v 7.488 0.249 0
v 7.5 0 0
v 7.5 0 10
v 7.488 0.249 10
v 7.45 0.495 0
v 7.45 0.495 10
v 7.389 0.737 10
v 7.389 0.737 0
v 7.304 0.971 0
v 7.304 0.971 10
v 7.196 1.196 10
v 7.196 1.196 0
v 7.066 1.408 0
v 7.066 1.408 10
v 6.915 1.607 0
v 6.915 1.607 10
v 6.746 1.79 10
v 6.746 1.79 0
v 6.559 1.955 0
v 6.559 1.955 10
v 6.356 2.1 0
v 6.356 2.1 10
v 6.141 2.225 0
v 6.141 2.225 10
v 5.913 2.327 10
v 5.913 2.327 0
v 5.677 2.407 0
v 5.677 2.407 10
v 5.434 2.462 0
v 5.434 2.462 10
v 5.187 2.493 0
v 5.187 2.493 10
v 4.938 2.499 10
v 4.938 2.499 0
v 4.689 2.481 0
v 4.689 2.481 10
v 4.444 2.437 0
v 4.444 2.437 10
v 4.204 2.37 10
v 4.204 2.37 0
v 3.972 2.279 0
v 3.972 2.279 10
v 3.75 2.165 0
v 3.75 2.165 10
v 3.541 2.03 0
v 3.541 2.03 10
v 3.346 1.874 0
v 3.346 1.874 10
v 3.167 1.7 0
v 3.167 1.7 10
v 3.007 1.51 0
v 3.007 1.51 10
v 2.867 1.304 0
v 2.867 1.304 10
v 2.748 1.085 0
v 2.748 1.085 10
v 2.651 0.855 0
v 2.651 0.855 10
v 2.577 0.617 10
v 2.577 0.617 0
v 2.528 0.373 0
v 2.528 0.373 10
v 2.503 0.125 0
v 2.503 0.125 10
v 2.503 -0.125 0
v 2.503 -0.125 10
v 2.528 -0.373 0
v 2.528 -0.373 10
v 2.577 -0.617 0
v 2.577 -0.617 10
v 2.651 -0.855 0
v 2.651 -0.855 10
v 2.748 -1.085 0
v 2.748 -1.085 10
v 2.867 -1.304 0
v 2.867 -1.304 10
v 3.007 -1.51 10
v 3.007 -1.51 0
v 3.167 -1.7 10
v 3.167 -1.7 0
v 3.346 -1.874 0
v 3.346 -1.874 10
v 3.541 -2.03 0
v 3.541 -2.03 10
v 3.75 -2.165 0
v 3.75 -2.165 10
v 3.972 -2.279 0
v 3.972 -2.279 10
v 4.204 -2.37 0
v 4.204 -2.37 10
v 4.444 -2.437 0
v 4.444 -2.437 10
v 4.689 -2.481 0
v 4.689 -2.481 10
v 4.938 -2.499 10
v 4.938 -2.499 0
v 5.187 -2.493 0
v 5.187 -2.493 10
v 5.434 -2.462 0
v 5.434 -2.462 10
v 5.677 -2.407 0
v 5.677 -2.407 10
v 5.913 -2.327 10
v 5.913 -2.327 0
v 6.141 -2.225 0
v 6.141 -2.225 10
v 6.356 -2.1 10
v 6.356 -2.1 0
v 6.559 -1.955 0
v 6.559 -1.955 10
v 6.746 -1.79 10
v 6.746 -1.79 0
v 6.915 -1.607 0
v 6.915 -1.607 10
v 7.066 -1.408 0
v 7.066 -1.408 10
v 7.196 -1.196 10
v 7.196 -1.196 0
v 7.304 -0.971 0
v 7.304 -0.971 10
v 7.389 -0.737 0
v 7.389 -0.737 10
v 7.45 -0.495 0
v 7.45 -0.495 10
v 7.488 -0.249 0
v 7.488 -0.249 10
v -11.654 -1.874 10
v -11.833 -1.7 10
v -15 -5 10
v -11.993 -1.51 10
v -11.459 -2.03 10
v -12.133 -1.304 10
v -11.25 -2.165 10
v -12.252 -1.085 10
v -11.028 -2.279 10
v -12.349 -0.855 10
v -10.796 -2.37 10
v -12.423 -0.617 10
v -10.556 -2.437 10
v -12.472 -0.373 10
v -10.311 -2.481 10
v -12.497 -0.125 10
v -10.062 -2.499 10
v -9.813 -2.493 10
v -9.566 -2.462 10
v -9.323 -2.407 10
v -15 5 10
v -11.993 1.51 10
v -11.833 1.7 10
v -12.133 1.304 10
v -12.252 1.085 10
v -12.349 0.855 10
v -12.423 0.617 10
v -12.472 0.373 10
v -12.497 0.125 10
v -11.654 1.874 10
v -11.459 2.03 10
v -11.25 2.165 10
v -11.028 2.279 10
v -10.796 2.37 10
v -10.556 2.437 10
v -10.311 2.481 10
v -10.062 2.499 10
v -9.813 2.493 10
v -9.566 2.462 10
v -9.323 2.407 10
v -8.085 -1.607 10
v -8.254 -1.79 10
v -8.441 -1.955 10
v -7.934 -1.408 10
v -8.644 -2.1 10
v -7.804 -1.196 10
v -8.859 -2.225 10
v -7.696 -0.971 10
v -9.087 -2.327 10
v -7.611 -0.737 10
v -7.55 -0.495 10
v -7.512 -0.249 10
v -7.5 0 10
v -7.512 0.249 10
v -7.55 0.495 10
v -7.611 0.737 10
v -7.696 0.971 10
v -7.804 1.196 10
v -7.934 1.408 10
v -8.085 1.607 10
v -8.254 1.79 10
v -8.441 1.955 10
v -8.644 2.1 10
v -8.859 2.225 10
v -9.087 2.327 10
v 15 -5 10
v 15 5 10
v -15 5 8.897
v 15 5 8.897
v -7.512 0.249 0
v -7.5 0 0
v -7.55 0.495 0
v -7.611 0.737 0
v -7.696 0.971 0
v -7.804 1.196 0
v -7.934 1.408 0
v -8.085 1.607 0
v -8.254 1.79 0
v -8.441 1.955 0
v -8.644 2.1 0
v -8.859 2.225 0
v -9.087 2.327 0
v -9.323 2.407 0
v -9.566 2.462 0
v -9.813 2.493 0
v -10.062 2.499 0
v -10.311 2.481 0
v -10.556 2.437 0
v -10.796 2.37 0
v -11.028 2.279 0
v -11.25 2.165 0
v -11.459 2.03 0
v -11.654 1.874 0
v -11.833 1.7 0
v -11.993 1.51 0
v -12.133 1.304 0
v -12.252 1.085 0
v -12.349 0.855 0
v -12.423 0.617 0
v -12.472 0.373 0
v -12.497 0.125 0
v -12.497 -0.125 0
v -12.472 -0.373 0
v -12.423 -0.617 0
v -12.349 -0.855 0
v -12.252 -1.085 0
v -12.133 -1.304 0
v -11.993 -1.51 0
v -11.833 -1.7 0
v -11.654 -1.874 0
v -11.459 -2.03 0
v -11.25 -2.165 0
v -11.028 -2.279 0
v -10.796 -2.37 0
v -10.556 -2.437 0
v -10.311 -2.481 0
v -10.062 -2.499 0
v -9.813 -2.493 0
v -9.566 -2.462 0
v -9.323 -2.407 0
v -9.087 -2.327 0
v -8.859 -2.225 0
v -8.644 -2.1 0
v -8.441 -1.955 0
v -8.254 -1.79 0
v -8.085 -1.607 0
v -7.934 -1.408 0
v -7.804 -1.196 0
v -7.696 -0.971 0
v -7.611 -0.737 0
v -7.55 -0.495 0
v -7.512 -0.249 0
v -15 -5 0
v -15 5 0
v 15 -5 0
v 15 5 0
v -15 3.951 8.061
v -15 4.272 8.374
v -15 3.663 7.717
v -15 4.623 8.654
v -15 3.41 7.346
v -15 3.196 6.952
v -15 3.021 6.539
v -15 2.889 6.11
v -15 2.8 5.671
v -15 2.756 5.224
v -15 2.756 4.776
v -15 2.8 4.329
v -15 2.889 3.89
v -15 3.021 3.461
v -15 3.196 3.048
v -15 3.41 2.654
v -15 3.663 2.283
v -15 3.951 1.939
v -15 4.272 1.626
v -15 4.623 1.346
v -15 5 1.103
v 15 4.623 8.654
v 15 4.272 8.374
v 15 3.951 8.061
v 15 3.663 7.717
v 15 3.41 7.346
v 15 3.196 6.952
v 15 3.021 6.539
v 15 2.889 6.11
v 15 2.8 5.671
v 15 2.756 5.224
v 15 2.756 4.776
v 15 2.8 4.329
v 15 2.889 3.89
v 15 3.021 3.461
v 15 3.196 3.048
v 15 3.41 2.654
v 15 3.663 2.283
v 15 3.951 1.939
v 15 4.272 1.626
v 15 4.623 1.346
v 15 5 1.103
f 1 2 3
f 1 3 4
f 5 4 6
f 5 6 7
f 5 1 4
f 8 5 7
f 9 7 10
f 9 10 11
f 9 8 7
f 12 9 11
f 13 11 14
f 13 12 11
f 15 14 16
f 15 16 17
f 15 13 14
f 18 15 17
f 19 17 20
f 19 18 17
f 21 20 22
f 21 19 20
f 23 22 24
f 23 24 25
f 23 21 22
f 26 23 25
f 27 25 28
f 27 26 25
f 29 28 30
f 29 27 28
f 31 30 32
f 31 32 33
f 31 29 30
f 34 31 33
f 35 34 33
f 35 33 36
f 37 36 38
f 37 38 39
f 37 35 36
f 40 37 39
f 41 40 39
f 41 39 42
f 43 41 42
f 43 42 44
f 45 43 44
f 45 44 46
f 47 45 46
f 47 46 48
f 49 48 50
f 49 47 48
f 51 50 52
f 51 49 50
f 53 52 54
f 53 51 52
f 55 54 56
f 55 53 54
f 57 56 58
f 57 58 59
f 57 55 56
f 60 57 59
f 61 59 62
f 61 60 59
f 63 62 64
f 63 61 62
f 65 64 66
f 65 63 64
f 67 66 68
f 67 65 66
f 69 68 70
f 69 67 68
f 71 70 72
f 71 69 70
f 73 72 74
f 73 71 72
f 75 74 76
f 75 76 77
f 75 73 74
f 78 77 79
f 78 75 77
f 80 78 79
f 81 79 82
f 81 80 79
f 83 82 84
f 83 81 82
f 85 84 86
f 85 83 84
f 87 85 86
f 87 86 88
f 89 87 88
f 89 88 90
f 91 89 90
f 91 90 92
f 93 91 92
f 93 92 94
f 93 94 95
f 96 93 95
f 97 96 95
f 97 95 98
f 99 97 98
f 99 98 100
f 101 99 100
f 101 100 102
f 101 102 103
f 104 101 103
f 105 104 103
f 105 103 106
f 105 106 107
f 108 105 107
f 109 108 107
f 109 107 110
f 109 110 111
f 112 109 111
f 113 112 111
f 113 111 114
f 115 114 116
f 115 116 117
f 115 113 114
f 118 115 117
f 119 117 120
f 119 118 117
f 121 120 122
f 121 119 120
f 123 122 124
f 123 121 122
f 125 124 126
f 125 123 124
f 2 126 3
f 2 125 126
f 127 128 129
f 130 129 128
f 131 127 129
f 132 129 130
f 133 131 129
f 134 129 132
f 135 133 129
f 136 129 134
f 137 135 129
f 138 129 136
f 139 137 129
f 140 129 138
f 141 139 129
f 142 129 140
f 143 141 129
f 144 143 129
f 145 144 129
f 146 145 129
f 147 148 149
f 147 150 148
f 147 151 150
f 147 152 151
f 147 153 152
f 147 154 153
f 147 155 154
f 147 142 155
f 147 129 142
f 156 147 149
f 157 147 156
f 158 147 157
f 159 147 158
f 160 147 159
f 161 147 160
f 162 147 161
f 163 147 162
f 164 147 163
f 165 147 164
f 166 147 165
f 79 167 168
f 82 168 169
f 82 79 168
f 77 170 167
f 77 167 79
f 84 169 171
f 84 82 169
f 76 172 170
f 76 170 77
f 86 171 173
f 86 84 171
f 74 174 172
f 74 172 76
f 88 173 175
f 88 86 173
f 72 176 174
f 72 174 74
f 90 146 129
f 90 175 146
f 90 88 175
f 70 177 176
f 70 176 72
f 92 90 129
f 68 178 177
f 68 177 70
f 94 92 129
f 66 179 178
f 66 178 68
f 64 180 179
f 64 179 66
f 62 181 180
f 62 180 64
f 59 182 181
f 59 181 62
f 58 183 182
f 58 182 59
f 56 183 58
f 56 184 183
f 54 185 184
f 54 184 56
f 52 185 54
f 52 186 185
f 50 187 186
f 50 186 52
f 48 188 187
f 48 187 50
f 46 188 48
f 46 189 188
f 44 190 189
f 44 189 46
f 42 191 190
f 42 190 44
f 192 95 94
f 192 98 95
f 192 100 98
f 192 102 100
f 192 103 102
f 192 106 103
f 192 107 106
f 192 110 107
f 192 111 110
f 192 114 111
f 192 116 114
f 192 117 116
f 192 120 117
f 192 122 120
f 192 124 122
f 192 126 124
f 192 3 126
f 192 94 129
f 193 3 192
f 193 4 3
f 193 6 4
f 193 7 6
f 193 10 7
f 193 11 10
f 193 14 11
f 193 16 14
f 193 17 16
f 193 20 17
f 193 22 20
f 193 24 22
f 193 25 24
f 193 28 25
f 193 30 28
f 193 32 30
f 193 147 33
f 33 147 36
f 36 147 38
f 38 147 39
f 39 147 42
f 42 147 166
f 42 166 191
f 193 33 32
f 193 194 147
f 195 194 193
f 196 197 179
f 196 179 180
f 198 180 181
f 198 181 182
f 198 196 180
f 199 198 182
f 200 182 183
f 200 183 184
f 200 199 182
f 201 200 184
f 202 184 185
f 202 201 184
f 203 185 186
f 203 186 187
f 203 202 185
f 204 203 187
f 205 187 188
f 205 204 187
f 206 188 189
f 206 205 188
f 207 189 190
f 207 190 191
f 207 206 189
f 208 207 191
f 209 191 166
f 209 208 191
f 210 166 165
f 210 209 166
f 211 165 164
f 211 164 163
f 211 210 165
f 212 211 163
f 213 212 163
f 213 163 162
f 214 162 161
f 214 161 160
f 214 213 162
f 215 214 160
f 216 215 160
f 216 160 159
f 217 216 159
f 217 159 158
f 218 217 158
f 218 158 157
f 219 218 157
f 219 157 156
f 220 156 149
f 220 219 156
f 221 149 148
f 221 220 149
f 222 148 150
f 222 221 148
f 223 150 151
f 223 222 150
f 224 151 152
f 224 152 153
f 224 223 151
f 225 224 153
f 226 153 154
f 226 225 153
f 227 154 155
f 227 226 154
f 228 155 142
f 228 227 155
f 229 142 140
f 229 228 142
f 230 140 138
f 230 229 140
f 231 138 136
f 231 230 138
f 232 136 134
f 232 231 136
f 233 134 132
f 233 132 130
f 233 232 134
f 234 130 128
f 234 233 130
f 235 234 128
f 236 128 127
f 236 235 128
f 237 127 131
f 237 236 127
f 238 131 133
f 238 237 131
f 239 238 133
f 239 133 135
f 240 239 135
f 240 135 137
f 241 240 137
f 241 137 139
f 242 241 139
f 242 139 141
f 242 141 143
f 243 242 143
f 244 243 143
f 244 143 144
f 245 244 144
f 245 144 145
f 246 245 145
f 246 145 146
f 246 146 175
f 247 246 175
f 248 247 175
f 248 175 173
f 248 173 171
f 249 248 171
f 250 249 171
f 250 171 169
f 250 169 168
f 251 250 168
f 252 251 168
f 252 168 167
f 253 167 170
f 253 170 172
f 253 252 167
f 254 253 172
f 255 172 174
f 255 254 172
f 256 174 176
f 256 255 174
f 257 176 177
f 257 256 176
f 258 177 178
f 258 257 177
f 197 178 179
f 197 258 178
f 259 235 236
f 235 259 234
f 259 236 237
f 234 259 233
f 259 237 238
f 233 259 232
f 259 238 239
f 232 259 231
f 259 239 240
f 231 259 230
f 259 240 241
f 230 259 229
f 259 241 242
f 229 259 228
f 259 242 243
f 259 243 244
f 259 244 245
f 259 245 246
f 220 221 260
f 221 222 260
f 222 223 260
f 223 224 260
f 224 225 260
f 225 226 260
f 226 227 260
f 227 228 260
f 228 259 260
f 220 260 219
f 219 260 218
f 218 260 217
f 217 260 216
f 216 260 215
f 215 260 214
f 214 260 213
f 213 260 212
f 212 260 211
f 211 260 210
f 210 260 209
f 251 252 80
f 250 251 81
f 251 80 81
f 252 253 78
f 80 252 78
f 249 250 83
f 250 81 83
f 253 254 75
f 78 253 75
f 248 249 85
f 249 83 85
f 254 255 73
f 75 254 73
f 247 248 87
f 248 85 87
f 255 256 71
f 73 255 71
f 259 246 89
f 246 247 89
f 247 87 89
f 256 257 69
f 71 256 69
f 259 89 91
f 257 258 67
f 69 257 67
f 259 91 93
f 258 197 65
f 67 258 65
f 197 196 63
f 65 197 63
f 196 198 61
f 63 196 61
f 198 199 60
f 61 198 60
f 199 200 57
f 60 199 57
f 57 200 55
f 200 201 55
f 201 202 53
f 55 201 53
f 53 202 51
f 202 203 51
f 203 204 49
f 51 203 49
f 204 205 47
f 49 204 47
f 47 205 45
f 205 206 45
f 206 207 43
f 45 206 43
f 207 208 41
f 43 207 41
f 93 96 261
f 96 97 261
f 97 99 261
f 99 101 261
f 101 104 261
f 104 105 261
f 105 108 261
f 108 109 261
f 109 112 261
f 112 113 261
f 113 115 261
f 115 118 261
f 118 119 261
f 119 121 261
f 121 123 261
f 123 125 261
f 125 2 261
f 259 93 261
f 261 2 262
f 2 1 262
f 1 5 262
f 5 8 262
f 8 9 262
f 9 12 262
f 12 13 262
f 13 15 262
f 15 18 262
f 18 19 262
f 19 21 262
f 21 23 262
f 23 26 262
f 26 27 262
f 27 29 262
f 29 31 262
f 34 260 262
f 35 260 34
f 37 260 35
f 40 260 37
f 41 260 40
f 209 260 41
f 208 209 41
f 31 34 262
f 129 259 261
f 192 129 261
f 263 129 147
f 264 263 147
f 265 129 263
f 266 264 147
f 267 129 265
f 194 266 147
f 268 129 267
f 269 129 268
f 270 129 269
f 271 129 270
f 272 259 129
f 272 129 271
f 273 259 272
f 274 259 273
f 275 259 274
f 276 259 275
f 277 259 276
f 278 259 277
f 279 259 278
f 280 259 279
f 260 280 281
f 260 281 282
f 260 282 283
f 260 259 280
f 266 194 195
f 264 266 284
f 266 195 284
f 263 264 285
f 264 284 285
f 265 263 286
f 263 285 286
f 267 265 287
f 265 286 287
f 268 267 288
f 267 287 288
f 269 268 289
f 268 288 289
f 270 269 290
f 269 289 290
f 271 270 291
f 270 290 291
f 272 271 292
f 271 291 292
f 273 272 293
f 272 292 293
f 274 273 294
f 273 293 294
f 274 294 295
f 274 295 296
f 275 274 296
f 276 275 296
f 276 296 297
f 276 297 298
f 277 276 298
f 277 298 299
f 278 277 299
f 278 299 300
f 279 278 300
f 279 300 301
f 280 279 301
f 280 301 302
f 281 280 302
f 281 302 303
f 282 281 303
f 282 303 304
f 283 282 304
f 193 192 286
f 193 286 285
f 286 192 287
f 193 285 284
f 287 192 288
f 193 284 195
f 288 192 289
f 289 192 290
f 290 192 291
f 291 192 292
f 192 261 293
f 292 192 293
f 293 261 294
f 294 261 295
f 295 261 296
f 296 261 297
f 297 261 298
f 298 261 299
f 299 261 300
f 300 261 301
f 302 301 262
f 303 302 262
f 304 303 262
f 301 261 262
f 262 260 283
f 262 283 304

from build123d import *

# Parameters (mm, degrees)
SKETCH_1_W          = 30
SKETCH_1_H          = 10
SKETCH_1_R          = 2.5
EXTRUDE_1_DEPTH     = 10
CUT_EXTRUDE_1_REACH = 34.016
SKETCH_2_R          = 4.5


with BuildPart() as part:
    # 草圖1 → 填料-伸長1 (new body)
    with BuildSketch(Plane.XY):
        Rectangle(SKETCH_1_W, SKETCH_1_H)
        with Locations((-10, 0)):
            Circle(SKETCH_1_R, mode=Mode.SUBTRACT)
        with Locations((5, 0)):
            Circle(SKETCH_1_R, mode=Mode.SUBTRACT)
    extrude(amount=EXTRUDE_1_DEPTH)

    # 草圖2 → 除料-伸長1 (cut, up to next)
    with BuildSketch(Plane(origin=(15, 0, 0), x_dir=(0, 0, -1), z_dir=(1, 0, 0)), mode=Mode.PRIVATE) as cut_extrude_1_sk1:
        with Locations((-5, 7.25)):
            Circle(SKETCH_2_R)
    cut_extrude_1_tool1 = extrude(cut_extrude_1_sk1.sketch, amount=-CUT_EXTRUDE_1_REACH, mode=Mode.PRIVATE) & part.part
    add(cut_extrude_1_tool1.solids().sort_by_distance((15, 7.25, 5))[0], mode=Mode.SUBTRACT)


solid = part.part
